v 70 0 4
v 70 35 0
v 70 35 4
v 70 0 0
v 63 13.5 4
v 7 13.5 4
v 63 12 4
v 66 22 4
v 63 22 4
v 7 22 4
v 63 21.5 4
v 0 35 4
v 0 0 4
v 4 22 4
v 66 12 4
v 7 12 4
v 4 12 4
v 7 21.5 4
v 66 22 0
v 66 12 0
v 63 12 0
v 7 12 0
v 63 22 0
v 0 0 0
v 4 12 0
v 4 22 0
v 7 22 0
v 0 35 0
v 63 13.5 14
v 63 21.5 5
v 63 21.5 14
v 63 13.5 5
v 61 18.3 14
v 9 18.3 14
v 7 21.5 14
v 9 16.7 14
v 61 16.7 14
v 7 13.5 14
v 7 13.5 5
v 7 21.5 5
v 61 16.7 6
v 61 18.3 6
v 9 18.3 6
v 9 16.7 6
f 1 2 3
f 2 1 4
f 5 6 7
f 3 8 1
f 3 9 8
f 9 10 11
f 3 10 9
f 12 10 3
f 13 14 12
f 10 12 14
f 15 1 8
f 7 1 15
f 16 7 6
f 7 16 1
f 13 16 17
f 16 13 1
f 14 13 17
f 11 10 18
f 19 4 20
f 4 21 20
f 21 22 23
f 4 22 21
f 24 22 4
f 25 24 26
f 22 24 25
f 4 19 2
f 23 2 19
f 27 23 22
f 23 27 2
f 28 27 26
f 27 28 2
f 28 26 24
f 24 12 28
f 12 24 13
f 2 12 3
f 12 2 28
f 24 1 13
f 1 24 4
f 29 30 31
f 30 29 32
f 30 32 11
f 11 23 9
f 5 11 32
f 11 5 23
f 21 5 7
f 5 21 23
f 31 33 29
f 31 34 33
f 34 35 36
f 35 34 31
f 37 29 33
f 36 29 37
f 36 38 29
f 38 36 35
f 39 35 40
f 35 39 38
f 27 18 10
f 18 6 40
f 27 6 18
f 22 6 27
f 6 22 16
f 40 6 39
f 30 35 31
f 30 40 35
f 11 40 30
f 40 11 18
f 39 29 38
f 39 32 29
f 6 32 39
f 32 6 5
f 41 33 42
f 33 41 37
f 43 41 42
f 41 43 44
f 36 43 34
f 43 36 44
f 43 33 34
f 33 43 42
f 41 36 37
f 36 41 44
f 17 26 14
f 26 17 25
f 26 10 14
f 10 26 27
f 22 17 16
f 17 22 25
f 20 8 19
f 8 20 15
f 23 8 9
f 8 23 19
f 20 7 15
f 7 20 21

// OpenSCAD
// Original MechIntel educational model. CC0-1.0. Units: mm.
// Not a standardized or load-rated component.
$fn=96;
length=70;
width=35;
base=4;
holder_length=56;
holder_width=8;
holder_height=10;
card_gap=1.6;
$fn=64;
difference(){union(){
translate([0,0,0]) cube([length,width,base]);
translate([(length-holder_length)/2,(width-holder_width)/2,base]) cube([holder_length,holder_width,holder_height]);
}
translate([(length-holder_length)/2+2,(width-card_gap)/2,base+2]) cube([holder_length-4,card_gap,holder_height]);
translate([4,12,-1]) cube([3,10,base+2]);
translate([63,12,-1]) cube([3,10,base+2]);
}
